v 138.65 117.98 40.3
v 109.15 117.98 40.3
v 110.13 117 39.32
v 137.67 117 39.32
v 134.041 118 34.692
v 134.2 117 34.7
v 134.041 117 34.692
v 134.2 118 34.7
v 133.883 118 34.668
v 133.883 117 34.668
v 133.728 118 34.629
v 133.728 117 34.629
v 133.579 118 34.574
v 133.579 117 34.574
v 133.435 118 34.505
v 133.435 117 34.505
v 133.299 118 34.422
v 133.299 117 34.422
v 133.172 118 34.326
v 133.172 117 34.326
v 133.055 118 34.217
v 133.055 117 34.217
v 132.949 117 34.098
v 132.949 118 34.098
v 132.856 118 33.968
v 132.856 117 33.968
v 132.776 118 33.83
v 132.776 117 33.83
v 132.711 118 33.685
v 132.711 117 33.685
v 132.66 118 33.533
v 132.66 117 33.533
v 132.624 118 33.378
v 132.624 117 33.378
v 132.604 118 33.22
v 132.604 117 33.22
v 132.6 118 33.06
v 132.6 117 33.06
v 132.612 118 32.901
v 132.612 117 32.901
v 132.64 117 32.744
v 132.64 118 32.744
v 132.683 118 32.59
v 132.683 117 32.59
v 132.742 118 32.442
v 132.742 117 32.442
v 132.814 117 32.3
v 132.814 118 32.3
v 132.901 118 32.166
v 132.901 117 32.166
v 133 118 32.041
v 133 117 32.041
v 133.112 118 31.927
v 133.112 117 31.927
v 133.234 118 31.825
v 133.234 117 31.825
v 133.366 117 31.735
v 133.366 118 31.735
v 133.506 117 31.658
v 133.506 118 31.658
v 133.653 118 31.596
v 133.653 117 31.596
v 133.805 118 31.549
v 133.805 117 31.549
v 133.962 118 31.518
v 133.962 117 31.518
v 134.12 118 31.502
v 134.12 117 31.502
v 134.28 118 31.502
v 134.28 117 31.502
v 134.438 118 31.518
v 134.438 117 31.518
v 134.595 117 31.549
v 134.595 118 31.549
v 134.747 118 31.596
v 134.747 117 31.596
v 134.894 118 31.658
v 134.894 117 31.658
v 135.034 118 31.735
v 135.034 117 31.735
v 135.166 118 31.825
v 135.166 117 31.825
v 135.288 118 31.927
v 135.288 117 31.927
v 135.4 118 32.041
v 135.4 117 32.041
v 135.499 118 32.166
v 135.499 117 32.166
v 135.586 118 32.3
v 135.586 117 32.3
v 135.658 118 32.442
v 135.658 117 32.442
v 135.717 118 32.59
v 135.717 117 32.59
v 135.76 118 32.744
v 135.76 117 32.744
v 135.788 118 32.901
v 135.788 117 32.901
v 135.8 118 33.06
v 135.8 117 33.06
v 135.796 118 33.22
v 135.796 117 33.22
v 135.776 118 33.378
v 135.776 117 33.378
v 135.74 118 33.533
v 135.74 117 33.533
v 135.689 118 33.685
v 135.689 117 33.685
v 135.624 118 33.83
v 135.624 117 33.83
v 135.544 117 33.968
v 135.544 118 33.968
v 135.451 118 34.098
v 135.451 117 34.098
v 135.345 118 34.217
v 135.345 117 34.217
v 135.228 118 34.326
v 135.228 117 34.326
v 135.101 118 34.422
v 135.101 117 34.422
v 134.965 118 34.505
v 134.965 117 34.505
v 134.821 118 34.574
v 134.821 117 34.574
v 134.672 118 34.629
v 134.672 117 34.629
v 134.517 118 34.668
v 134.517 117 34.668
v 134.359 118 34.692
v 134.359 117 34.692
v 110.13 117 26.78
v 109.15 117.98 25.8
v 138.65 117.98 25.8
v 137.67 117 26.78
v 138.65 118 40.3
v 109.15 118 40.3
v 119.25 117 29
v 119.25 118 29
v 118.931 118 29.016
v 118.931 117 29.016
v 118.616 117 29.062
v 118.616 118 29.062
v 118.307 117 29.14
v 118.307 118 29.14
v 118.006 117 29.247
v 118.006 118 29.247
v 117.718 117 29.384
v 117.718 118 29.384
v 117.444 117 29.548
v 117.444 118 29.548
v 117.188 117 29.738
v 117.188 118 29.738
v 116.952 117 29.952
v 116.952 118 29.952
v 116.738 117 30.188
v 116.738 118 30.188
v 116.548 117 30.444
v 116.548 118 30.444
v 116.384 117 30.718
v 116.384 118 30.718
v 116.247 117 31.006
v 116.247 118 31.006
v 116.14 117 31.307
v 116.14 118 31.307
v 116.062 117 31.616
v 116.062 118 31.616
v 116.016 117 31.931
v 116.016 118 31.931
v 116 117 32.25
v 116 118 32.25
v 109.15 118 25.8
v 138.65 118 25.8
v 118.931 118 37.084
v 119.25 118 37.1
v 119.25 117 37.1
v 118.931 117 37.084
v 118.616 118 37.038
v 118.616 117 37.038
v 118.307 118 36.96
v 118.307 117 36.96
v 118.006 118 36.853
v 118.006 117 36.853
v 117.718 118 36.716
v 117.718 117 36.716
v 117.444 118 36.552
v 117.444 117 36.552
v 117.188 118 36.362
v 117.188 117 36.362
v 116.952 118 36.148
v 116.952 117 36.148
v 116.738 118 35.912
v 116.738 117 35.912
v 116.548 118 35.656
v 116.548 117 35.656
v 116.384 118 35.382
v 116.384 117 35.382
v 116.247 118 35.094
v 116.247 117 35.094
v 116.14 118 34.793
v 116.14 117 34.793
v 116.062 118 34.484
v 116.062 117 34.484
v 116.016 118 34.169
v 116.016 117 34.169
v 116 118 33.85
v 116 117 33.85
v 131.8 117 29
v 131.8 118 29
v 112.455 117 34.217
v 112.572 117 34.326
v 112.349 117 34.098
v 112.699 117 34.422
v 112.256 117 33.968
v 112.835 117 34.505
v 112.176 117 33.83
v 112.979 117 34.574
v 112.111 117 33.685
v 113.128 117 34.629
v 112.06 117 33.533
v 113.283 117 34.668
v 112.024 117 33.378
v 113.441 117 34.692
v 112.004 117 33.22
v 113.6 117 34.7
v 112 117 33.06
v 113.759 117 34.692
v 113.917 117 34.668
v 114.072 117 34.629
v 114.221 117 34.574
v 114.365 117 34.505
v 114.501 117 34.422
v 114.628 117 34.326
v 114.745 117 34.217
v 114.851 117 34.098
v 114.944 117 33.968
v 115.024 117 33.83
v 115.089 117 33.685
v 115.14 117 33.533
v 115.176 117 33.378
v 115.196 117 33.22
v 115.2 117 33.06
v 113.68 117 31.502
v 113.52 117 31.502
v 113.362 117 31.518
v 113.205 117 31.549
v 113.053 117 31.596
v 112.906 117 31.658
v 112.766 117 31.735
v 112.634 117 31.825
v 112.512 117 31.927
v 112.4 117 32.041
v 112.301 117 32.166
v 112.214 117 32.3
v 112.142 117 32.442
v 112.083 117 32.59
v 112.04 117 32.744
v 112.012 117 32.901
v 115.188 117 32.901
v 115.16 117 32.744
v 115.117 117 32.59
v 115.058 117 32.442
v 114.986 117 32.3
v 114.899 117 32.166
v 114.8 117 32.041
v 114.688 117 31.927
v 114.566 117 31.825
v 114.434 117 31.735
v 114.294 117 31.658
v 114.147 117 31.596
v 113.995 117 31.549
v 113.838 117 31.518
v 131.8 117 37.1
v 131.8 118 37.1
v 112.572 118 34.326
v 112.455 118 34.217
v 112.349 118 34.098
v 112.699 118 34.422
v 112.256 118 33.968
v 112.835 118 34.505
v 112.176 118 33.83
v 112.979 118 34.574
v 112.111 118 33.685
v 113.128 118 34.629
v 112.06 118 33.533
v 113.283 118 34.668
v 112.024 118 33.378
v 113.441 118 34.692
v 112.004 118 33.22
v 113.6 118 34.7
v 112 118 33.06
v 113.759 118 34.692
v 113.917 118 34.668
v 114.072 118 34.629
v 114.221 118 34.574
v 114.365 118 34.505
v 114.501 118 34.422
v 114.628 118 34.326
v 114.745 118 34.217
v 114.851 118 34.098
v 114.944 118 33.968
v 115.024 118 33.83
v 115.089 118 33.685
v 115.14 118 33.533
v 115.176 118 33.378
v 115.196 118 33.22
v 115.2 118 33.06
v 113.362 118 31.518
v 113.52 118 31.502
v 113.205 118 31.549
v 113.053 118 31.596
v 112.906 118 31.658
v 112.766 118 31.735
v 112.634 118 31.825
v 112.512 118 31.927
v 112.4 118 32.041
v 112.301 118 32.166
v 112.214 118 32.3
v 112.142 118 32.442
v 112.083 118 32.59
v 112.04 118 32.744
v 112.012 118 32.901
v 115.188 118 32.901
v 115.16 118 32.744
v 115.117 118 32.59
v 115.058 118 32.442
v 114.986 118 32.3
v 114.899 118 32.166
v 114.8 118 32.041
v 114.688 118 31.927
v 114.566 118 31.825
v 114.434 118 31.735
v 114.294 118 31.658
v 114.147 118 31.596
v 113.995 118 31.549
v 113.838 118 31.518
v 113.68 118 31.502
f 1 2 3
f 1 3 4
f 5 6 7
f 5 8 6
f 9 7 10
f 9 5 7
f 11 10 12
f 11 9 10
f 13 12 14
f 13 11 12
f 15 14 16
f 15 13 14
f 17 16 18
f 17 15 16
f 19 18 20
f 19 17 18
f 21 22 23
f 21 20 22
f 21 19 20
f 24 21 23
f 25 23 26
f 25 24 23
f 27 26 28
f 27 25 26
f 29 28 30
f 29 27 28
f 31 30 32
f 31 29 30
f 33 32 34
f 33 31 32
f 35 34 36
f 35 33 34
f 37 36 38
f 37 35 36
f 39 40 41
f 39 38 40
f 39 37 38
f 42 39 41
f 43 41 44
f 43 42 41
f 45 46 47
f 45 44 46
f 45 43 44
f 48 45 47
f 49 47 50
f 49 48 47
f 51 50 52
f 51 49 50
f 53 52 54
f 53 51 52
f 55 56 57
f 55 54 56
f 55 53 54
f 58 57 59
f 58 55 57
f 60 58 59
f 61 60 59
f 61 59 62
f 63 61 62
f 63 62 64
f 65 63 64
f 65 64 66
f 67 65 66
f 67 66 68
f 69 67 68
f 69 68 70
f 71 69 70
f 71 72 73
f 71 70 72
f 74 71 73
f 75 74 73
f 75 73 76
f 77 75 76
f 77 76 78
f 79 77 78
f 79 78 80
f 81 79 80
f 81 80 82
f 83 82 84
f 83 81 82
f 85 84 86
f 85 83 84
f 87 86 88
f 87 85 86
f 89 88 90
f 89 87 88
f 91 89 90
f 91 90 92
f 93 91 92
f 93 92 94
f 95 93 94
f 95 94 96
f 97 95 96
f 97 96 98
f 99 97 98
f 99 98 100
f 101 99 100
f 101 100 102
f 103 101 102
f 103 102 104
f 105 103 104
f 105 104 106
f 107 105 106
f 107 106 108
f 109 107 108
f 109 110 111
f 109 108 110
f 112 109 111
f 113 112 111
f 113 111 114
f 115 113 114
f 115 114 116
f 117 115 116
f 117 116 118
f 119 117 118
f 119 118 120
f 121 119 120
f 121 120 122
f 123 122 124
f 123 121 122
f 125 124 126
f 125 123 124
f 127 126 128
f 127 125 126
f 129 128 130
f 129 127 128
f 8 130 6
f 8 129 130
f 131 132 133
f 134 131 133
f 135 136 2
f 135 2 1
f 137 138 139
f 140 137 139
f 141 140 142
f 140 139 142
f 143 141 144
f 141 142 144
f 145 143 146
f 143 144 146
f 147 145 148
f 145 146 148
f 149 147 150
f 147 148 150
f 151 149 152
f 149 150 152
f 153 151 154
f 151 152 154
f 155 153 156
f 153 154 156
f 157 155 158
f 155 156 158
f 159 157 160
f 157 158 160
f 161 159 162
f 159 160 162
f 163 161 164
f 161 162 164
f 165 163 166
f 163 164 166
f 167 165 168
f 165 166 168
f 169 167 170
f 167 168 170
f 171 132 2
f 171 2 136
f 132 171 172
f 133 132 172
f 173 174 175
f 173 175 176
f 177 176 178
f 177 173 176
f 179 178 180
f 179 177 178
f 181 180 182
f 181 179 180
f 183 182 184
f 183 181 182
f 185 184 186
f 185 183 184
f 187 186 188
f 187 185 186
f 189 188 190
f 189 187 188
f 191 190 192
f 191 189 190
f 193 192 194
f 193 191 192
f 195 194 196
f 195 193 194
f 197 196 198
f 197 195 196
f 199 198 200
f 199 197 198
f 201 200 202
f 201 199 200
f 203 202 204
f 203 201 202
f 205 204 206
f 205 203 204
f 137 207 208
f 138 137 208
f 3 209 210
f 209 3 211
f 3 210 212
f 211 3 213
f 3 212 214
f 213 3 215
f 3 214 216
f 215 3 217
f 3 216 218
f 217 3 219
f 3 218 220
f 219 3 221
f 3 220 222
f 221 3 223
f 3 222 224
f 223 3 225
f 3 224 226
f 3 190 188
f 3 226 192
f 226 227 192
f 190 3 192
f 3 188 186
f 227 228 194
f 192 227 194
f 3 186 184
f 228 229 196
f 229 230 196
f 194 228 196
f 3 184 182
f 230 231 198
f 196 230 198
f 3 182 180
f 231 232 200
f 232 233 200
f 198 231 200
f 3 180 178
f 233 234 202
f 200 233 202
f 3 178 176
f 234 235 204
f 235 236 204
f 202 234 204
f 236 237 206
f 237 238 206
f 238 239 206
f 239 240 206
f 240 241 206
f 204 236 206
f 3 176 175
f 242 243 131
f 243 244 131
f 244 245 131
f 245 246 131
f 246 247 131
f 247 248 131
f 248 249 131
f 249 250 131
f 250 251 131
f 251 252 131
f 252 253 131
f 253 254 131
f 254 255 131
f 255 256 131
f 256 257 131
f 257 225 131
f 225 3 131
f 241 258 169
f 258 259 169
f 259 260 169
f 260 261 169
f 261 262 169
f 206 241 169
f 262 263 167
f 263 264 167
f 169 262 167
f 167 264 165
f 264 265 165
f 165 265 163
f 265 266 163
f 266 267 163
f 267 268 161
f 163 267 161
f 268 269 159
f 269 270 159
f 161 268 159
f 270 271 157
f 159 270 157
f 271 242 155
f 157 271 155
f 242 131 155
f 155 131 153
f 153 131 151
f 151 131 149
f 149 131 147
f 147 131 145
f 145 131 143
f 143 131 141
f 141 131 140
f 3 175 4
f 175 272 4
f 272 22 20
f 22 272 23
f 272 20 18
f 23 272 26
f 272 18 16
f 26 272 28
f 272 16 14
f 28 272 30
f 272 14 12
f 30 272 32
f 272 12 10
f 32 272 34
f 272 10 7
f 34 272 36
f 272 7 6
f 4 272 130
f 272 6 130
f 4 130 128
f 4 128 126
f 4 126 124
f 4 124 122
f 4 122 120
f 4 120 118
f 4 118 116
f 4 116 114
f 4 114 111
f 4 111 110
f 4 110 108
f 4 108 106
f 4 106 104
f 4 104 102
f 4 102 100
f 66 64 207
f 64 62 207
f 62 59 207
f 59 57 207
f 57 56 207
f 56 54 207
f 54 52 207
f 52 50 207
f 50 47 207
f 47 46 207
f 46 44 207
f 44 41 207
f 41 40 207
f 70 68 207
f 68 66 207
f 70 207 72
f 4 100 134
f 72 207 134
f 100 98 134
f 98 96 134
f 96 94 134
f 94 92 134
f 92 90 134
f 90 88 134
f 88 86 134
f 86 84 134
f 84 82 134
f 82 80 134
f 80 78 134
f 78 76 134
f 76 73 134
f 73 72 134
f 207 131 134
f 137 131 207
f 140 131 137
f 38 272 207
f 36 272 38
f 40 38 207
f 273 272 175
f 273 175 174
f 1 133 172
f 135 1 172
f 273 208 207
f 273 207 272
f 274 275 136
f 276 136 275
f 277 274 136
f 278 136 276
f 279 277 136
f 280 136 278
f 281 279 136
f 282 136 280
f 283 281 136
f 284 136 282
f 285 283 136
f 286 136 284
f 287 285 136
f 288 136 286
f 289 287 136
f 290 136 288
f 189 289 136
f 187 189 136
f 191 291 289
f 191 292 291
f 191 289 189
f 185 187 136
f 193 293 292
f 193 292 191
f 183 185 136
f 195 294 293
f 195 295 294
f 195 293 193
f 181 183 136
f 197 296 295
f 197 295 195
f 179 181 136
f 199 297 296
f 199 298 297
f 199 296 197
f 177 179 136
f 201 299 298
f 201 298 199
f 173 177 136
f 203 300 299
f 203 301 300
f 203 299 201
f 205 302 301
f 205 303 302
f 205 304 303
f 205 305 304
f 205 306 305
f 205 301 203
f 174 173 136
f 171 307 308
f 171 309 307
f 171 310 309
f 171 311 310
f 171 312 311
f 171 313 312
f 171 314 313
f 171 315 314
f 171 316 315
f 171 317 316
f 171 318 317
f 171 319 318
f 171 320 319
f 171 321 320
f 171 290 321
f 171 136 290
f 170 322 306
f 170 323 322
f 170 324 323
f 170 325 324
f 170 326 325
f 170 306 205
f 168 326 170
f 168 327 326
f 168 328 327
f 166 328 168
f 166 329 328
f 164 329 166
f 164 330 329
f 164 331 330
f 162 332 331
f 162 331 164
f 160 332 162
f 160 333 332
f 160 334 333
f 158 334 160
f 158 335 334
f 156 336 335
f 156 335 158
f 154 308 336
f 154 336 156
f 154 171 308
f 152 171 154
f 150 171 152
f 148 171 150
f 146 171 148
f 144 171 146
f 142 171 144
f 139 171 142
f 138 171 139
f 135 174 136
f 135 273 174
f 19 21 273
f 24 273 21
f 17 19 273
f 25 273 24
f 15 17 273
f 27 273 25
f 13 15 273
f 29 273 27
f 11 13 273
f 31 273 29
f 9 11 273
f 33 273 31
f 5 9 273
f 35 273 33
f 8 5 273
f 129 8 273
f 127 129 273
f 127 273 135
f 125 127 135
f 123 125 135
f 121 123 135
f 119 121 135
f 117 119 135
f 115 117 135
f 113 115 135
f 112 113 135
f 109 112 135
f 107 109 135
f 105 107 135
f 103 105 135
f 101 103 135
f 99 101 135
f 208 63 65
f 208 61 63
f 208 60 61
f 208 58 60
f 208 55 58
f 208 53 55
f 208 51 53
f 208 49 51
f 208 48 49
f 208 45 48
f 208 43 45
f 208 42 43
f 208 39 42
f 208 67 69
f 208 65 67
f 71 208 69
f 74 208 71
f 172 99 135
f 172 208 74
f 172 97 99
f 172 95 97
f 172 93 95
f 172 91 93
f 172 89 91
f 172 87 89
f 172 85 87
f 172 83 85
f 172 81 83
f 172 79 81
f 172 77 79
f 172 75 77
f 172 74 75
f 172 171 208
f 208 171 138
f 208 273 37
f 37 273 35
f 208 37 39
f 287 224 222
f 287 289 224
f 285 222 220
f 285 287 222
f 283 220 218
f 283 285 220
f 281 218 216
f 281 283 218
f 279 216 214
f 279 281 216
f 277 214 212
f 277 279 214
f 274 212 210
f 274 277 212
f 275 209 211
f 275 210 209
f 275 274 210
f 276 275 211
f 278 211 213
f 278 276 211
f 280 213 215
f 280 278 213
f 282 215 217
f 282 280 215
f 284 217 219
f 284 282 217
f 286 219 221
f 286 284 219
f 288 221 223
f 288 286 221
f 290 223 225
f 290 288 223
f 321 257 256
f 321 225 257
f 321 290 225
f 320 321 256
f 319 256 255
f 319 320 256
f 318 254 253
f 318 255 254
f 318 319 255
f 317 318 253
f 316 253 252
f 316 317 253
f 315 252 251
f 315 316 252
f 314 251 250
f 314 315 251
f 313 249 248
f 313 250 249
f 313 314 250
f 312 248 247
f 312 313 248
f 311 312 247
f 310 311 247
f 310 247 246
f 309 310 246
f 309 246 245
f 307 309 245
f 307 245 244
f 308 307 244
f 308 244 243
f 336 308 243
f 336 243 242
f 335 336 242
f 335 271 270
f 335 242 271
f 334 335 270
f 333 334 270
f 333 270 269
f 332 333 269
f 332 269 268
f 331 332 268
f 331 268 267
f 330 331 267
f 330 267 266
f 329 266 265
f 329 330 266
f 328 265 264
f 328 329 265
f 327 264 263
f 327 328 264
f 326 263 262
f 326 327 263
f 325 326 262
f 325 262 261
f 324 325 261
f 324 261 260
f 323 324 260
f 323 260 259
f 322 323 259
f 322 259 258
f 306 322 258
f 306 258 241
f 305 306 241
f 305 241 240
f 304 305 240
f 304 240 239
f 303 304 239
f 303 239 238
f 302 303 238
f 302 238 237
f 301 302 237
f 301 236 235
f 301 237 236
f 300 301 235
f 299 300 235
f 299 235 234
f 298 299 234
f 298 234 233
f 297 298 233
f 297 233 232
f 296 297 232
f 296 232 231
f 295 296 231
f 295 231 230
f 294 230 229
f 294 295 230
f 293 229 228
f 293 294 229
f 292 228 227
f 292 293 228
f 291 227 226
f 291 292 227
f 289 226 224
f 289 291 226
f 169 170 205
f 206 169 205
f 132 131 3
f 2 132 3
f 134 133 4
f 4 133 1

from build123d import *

# Parameters (mm, degrees)
BOX085084_W                                                = 8.1
BOX085084_H                                                = 10
BOX085084_DEPTH                                            = 15.8
FILLET005011017044_R                                       = 3.25
CYLINDER053_R                                              = 1.6
CYLINDER053_DEPTH                                          = 10
CYLINDER054_R                                              = 1.6
CYLINDER054_DEPTH                                          = 10
FUSION004008002002002001007002002026012008_PLACEMENT_ANGLE = 90
BOX085130_W                                                = 29.5
BOX085130_H                                                = 1
BOX085130_DEPTH                                            = 14.5
CHAMFER011006003017049_SIZE                                = 0.98


with BuildPart() as fillet005011017044:
    # Box085084 → Box085084 (new body)
    with BuildSketch(Plane(origin=(15.9, 118, 17.9), x_dir=(1, 0, 0), z_dir=(0, 0, 1))):
        with Locations((4.05, 5)):
            Rectangle(BOX085084_W, BOX085084_H)
    extrude(amount=BOX085084_DEPTH)

    # Fillet005011017044
    fillet005011017044_edges = [fillet005011017044.edges().sort_by_distance(p)[0] for p in [
        (15.9, 123, 33.7),
        (24, 123, 33.7),
    ]]
    fillet(fillet005011017044_edges, radius=FILLET005011017044_R)


with BuildPart() as cylinder053:
    # Cylinder053 → Cylinder053 (new body)
    with BuildSketch(Plane(origin=(20, 128, 15.5), x_dir=(1, 0, 0), z_dir=(0, -1, 0))):
        Circle(CYLINDER053_R)
    extrude(amount=CYLINDER053_DEPTH)


with BuildPart() as xt60e_m_holes:
    # Cylinder054 → Cylinder054 (new body)
    with BuildSketch(Plane(origin=(20, 128, 36.1), x_dir=(1, 0, 0), z_dir=(0, -1, 0))):
        Circle(CYLINDER054_R)
    extrude(amount=CYLINDER054_DEPTH)

    # Fusion004008002002002001007002002026012008: union Fillet005011017044, Cylinder053
    add(fillet005011017044.part)
    add(cylinder053.part)


with BuildPart() as xt60e_m_holes_1:
    # Fusion004008002002002001007002002026012008 placement: moved
    add(xt60e_m_holes.part.moved(Location((149.7, -4, 13.1))).rotate(Axis((149.7, -4, 13.1), (0, -1, 0)), FUSION004008002002002001007002002026012008_PLACEMENT_ANGLE))


with BuildPart() as cut001002016041:
    # Box085130 → Box085130 (new body)
    with BuildSketch(Plane(origin=(113.15, 117, 27.8), x_dir=(1, 0, 0), z_dir=(0, 0, 1))):
        with Locations((14.75, 0.5)):
            Rectangle(BOX085130_W, BOX085130_H)
    extrude(amount=BOX085130_DEPTH)

    # Chamfer011006003017049
    chamfer011006003017049_edges = [cut001002016041.edges().sort_by_distance(p)[0] for p in [
        (113.15, 117, 35.05),
        (142.65, 117, 35.05),
        (127.9, 117, 27.8),
        (127.9, 117, 42.3),
    ]]
    chamfer(chamfer011006003017049_edges, length=CHAMFER011006003017049_SIZE)


with BuildPart() as cut001002016041_1:
    # Chamfer011006003017049 placement: moved
    add(cut001002016041.part.moved(Location((-4, 0, -2))))

    # Cut001002016041: cut XT60E-M Holes
    add(xt60e_m_holes_1.part, mode=Mode.SUBTRACT)


solid = cut001002016041_1.part
